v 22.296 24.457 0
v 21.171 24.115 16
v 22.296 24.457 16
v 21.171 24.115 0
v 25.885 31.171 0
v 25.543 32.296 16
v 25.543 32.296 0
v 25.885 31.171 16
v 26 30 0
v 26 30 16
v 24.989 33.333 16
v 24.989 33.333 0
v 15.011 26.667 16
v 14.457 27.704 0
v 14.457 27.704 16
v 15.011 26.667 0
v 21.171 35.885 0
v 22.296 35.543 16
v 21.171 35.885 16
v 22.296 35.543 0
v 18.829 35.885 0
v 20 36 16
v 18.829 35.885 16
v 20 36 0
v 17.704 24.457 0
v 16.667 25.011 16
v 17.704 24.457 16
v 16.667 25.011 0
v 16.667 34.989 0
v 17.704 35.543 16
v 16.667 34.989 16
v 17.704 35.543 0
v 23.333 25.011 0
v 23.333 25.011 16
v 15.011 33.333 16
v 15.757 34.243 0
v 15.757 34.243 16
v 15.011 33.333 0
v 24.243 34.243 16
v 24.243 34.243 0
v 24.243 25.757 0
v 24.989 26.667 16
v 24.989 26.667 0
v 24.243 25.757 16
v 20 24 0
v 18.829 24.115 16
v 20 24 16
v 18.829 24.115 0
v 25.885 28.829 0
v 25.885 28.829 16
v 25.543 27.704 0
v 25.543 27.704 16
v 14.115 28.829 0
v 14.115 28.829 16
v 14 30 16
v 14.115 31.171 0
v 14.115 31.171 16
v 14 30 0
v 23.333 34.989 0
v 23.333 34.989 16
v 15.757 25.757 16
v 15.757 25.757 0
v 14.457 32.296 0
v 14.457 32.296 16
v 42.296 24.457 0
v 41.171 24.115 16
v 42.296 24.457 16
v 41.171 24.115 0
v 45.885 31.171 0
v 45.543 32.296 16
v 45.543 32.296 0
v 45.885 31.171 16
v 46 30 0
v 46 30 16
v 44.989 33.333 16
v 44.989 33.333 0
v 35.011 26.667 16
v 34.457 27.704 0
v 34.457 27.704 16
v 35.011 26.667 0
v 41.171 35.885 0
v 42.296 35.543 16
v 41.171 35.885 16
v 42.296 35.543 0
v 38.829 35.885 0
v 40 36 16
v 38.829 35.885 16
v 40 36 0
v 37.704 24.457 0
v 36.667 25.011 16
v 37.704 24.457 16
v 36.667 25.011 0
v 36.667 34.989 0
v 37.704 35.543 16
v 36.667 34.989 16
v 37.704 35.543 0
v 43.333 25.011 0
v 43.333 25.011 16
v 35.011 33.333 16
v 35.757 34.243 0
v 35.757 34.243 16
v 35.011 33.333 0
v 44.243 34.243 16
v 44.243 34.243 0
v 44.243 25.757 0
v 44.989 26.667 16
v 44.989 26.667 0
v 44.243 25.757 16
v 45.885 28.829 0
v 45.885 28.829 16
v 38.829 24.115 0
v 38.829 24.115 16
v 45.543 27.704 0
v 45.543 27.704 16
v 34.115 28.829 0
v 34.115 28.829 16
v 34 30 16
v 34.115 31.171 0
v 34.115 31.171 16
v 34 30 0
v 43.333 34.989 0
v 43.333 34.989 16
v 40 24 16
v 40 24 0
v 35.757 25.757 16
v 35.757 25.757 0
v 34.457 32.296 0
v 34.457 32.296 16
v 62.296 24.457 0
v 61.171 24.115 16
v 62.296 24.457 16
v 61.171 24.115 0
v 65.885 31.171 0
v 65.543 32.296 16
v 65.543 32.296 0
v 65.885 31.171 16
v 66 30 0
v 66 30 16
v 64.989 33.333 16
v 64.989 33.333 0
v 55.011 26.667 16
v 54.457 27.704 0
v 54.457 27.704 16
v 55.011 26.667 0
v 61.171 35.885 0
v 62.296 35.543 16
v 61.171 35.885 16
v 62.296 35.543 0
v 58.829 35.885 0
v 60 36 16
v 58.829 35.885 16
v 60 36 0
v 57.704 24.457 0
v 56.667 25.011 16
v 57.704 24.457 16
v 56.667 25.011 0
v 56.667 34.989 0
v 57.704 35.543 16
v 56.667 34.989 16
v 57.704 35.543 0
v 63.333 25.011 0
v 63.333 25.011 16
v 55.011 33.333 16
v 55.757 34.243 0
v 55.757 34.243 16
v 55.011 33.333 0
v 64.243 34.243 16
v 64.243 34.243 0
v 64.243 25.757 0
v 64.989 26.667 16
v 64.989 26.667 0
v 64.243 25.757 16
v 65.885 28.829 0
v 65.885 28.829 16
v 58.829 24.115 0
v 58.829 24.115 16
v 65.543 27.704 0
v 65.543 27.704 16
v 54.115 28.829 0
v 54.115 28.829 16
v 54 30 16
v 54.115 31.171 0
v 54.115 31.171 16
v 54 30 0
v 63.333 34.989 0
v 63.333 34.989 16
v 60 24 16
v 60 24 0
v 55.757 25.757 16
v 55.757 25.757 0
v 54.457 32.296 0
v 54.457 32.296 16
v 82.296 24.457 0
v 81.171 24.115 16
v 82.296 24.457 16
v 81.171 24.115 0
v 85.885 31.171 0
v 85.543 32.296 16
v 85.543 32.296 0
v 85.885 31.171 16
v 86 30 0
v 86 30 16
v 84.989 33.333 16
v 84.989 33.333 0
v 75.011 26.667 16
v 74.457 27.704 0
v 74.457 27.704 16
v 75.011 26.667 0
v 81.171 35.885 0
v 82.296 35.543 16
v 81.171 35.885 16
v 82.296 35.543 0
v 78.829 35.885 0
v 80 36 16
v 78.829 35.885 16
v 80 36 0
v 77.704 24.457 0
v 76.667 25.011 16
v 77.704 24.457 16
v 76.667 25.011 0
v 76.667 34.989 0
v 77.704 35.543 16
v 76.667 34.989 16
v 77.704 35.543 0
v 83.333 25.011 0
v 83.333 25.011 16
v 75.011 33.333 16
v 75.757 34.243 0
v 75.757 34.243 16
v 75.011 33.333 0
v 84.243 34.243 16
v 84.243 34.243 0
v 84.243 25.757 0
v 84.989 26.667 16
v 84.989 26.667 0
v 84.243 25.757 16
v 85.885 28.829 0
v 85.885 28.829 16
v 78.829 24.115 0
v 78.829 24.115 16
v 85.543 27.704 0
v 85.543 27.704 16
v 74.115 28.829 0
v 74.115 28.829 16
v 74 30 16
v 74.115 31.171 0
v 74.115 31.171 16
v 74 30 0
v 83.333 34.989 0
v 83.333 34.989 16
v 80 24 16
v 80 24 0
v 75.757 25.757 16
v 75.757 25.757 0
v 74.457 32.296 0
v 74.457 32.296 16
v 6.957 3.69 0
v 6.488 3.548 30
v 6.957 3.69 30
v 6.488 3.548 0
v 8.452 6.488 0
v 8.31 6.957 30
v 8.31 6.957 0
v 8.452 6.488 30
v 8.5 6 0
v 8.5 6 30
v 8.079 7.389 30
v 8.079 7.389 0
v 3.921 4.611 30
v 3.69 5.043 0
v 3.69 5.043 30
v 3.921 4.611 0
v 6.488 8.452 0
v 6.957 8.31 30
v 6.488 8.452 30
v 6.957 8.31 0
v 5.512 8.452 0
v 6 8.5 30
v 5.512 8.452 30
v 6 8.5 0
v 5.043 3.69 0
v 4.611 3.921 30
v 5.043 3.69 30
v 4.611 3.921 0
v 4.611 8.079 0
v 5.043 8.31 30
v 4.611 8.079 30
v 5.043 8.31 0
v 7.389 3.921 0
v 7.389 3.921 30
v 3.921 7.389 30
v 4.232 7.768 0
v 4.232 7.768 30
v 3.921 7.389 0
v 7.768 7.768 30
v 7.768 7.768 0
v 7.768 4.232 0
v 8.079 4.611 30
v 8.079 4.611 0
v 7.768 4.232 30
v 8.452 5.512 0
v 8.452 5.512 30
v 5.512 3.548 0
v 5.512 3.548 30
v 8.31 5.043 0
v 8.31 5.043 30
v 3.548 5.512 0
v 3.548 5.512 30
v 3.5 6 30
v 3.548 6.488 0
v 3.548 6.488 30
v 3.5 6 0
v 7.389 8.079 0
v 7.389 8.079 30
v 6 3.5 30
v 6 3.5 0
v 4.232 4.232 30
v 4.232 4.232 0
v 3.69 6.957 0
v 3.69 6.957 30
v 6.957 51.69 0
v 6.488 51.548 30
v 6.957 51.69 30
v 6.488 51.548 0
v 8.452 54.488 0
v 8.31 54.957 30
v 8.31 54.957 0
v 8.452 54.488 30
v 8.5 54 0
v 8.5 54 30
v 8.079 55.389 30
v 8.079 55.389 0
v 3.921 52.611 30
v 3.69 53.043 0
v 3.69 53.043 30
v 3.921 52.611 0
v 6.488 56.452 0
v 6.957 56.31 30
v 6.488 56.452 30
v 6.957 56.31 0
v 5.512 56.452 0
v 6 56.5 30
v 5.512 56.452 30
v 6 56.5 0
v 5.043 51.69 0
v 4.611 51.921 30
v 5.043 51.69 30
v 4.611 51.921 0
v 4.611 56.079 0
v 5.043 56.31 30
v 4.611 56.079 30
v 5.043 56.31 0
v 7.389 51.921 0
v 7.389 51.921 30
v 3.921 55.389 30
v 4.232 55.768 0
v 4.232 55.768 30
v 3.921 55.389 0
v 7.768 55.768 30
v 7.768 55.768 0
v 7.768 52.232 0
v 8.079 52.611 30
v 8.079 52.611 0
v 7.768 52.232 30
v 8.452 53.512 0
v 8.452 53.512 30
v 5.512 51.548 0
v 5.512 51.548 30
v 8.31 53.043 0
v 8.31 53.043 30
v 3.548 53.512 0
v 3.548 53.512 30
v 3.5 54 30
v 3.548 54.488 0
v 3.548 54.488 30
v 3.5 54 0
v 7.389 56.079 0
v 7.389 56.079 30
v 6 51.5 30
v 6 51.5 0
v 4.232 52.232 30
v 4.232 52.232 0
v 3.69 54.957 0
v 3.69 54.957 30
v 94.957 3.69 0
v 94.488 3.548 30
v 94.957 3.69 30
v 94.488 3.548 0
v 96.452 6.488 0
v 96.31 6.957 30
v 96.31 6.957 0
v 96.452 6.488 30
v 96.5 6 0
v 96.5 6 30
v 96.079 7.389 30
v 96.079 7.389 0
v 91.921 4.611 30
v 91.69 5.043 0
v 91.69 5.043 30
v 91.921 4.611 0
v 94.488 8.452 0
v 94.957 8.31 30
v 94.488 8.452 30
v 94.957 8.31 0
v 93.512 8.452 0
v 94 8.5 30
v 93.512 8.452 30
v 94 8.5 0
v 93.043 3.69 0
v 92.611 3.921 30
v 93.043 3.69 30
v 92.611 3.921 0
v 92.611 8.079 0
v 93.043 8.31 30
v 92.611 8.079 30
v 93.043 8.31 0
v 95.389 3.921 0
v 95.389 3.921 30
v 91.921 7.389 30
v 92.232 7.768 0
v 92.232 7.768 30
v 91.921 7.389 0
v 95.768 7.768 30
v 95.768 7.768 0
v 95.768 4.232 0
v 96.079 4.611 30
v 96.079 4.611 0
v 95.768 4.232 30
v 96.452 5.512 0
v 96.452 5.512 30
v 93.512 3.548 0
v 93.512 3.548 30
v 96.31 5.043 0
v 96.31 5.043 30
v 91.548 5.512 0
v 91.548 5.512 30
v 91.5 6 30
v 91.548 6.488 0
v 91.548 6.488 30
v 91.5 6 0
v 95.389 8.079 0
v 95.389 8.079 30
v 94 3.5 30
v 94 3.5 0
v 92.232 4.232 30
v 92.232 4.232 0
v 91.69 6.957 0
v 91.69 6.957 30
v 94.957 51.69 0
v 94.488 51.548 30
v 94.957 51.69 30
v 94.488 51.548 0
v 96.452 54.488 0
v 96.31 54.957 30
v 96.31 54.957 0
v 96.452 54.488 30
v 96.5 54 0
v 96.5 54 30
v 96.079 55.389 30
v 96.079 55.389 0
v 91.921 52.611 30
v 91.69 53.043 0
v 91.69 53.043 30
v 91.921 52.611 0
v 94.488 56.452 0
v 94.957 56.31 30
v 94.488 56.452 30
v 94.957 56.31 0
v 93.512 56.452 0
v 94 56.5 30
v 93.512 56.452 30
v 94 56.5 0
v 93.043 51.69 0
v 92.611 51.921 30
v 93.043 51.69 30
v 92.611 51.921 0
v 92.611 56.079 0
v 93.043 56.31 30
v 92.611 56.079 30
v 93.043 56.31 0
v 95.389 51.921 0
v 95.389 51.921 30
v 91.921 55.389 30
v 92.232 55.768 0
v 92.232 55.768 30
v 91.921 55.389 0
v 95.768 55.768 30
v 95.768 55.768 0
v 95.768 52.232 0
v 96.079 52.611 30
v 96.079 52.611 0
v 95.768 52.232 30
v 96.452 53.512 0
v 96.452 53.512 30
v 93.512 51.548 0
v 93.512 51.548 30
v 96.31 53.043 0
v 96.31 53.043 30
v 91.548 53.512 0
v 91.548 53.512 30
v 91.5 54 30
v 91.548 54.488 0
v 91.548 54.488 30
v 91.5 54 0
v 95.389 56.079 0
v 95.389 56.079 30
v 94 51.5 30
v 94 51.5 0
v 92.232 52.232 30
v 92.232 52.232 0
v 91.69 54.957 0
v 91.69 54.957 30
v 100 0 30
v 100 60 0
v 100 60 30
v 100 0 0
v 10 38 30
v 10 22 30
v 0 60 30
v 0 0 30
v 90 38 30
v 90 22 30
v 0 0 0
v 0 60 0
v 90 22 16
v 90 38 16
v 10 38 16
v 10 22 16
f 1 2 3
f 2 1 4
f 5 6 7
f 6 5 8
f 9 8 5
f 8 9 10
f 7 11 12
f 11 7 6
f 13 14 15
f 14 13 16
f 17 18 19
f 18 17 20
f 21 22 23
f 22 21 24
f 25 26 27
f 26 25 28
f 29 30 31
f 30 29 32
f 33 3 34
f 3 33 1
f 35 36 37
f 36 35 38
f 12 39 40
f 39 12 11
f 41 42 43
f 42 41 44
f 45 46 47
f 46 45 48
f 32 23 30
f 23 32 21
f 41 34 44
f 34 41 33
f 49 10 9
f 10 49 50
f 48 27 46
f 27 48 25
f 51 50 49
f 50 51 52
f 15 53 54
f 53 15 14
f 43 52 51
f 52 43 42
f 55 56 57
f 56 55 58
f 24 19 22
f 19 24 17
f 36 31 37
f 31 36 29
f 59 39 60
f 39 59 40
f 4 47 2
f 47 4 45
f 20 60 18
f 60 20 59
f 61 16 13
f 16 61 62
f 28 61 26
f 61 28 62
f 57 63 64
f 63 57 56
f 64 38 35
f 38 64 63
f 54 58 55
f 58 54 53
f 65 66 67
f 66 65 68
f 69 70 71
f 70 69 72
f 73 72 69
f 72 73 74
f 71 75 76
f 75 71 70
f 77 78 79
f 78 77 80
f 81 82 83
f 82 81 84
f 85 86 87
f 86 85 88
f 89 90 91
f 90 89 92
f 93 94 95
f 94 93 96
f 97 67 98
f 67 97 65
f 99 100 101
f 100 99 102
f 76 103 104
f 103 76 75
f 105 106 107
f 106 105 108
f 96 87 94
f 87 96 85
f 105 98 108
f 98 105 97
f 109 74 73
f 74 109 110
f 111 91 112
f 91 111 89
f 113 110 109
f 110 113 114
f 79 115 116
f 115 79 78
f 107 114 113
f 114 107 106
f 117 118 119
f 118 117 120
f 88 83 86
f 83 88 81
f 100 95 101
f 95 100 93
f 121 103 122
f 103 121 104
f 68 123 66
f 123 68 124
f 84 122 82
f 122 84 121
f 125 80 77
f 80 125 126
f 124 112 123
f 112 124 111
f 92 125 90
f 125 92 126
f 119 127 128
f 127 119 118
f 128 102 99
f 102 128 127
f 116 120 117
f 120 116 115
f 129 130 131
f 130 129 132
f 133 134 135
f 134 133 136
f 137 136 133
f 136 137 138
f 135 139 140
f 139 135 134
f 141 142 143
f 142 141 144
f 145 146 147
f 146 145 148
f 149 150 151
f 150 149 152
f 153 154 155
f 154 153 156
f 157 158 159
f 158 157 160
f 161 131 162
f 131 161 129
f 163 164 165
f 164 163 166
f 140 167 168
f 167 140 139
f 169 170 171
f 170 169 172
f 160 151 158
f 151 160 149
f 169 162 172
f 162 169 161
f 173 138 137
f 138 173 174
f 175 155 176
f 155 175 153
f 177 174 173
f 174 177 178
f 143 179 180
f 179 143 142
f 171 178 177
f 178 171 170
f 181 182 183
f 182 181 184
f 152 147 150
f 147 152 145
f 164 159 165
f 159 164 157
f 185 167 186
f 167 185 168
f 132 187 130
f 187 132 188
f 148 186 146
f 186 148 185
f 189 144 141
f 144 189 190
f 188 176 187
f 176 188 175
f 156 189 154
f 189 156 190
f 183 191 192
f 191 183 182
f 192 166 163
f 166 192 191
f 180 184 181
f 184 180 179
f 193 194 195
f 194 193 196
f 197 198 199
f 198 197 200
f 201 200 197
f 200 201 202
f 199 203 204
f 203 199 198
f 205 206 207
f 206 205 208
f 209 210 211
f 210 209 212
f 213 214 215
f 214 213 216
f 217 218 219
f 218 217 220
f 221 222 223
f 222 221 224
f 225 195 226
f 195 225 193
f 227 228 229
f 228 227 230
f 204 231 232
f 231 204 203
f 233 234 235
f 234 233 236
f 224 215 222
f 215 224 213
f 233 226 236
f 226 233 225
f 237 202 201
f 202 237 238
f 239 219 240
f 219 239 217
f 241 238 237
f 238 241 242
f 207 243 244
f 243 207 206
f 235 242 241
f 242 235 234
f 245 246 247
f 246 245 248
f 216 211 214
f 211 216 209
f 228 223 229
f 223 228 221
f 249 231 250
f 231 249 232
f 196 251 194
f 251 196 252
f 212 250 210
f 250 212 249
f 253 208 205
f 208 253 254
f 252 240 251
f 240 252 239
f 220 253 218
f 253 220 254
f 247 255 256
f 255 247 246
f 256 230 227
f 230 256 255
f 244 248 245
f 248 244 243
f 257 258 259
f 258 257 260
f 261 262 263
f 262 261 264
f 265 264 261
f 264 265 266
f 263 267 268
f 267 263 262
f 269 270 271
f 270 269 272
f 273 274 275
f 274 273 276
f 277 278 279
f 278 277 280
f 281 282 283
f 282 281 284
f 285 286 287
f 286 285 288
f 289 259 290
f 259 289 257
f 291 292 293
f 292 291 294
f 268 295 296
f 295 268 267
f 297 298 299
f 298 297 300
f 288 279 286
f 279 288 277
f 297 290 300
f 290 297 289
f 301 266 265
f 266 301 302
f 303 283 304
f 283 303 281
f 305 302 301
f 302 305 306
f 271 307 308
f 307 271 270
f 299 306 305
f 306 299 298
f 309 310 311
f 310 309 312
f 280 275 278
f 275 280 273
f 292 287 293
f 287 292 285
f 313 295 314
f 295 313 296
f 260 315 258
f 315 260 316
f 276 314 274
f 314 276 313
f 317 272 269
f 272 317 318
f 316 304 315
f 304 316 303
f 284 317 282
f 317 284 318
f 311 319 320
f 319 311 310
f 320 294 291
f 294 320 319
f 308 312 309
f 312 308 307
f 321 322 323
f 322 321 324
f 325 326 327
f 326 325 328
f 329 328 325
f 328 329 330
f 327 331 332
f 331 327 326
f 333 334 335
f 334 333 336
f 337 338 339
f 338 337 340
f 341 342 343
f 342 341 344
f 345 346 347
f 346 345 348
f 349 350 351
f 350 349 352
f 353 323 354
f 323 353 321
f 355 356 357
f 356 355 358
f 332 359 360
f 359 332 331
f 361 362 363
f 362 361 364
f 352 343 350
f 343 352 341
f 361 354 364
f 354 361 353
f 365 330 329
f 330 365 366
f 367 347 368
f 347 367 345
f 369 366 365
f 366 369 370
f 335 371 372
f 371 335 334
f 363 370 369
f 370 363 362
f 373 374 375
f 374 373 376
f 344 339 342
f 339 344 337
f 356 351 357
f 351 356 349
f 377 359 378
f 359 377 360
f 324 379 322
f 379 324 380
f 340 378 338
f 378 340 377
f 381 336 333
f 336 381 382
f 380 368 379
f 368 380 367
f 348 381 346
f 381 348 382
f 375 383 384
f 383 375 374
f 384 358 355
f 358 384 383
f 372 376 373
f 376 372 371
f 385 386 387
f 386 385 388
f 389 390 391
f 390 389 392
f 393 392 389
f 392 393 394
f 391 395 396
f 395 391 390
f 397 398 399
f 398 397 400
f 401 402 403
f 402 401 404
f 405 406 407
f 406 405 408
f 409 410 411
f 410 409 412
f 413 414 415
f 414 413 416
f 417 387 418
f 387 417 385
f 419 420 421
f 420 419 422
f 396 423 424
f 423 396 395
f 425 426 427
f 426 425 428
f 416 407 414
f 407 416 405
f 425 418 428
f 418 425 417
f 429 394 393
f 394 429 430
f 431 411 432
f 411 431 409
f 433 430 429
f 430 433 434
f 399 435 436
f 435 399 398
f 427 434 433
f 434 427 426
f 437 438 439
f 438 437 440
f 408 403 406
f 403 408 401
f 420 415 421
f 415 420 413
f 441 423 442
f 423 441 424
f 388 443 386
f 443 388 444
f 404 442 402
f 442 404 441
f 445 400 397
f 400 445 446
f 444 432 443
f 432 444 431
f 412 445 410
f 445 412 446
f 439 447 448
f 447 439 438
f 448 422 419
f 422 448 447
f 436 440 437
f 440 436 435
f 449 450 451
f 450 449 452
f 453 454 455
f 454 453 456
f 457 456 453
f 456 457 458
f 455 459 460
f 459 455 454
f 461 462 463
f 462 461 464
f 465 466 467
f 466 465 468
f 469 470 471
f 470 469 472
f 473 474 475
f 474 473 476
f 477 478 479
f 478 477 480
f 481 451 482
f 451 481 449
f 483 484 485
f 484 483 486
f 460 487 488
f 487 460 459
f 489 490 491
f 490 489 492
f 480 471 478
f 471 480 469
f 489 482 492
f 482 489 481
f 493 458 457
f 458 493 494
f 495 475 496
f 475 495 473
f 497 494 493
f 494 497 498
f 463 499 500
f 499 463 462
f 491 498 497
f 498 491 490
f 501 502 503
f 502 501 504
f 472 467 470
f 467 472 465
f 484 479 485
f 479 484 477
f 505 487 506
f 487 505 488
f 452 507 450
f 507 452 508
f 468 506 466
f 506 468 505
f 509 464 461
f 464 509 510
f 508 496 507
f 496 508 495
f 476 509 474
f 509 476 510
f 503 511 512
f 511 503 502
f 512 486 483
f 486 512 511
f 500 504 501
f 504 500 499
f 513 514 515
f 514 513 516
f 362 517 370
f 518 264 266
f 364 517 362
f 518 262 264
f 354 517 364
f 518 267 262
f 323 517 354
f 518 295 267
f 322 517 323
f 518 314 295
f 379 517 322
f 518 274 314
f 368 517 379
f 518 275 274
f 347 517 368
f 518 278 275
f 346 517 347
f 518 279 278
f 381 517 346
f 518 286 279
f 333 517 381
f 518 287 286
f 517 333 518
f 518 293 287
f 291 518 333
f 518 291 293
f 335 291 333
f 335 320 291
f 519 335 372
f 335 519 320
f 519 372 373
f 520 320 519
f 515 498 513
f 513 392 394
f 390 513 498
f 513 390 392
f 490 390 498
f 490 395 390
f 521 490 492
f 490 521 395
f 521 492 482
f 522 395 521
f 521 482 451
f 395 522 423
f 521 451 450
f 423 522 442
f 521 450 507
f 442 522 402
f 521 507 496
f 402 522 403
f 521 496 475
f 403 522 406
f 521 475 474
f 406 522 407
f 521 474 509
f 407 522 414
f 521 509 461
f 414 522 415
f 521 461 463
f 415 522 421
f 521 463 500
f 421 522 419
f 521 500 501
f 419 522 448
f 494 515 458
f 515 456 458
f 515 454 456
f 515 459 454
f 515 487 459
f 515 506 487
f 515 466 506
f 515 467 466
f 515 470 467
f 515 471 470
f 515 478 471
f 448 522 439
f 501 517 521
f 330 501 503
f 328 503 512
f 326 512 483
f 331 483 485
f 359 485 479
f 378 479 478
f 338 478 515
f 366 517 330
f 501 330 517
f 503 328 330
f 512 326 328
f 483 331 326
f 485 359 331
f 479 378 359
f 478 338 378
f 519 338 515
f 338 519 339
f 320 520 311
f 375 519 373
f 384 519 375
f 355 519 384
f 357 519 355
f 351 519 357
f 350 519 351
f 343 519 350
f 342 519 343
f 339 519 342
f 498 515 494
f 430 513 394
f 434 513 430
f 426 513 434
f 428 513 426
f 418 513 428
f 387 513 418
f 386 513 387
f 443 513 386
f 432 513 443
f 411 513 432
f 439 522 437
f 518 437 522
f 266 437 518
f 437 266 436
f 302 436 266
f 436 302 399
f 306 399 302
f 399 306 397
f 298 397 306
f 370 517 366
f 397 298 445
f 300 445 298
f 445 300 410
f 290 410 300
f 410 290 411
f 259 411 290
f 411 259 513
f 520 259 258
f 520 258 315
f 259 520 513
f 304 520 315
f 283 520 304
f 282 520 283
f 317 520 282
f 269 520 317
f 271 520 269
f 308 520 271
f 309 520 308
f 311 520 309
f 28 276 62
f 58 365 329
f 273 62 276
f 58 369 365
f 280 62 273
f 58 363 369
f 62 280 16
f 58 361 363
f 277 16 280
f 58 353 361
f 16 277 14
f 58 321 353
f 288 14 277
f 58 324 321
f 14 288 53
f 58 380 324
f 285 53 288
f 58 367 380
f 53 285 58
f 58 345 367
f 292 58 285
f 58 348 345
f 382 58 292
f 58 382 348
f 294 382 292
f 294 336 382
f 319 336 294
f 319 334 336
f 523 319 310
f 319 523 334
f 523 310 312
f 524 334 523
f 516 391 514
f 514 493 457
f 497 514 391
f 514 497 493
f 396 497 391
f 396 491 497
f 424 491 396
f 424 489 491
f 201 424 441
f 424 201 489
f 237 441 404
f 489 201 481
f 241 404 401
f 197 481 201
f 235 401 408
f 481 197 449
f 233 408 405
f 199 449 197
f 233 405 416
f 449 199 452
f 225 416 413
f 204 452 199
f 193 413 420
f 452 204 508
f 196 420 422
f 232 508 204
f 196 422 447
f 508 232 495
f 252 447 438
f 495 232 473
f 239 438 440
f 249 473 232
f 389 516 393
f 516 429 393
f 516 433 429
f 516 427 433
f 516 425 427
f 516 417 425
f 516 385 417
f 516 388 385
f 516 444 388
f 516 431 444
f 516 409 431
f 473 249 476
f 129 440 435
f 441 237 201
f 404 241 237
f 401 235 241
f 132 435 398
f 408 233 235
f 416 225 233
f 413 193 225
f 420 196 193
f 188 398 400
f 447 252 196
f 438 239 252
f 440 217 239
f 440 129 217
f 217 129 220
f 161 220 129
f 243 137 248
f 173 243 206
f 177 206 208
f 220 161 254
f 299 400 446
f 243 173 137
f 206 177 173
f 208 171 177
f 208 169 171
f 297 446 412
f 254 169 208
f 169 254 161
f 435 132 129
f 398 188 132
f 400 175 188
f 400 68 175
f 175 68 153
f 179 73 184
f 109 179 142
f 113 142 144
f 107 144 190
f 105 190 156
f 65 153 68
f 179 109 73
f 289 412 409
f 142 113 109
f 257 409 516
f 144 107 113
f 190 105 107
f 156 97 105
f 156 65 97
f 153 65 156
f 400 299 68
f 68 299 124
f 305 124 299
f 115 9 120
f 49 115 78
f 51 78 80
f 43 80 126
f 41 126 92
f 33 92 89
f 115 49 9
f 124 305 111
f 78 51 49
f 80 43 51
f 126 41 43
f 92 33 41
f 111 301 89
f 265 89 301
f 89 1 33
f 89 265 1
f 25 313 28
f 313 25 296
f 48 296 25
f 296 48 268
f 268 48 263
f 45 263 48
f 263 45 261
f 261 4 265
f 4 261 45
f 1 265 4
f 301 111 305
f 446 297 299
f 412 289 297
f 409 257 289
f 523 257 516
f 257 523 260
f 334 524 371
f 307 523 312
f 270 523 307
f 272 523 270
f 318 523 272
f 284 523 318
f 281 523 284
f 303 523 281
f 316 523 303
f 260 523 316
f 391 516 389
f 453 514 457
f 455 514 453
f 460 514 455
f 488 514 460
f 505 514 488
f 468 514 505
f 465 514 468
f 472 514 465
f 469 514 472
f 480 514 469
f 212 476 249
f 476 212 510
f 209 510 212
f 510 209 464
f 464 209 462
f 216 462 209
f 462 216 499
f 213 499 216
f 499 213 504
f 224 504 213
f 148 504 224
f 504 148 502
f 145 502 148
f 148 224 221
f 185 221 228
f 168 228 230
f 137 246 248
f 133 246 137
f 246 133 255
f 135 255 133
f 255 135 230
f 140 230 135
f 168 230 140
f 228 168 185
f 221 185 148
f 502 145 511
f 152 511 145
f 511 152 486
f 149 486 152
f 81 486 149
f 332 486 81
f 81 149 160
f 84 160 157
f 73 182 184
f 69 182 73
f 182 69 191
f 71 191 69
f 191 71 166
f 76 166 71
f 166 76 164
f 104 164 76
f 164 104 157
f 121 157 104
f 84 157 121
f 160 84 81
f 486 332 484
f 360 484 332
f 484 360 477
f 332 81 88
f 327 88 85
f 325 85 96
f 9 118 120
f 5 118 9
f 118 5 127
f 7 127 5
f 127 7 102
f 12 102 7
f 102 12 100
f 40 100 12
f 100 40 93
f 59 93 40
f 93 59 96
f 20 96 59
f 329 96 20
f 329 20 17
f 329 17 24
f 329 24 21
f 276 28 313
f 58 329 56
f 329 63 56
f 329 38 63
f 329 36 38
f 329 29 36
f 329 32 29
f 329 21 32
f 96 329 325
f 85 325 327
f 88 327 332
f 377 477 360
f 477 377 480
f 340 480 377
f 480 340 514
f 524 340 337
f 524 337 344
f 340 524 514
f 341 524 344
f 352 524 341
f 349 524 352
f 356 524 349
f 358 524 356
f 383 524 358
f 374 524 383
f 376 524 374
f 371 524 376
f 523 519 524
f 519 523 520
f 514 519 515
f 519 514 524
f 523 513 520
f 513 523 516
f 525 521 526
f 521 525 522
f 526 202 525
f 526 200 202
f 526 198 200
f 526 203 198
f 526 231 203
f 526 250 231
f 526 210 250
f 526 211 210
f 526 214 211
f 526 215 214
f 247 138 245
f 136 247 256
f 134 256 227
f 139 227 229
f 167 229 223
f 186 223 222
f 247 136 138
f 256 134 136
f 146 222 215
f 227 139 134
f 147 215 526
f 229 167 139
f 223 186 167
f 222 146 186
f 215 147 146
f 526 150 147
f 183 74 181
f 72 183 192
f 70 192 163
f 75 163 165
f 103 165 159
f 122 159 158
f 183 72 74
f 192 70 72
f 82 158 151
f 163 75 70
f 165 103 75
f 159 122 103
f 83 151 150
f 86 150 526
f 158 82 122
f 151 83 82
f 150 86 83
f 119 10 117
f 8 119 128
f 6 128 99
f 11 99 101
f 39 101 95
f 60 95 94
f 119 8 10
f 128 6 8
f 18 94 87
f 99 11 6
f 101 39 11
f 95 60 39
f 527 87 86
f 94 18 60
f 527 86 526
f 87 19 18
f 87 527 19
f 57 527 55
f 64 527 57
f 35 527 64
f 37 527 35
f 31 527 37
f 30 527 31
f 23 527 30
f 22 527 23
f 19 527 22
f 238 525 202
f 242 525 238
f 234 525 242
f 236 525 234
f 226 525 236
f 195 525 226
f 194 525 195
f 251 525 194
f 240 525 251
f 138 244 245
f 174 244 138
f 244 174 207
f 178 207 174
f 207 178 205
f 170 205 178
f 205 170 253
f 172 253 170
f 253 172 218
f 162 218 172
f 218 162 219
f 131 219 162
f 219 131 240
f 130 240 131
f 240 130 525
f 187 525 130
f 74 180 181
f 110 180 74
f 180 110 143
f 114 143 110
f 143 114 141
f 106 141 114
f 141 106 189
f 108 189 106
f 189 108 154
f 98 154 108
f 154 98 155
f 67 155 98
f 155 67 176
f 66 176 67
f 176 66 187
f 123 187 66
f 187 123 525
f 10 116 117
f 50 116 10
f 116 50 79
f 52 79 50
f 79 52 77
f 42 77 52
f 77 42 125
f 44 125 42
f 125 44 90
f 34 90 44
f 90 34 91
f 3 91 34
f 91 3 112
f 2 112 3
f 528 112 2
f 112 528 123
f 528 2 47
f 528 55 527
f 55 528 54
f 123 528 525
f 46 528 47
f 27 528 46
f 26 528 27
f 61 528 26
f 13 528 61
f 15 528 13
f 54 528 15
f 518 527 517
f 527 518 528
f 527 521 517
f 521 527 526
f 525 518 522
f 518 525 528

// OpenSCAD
$fn = 32;

// ----------------------------------------------------------------------
// Manifold block: gallery_top manifold
// ----------------------------------------------------------------------

// --- parameters (mm) ---
block_l = 100;            // block length, X
block_w = 60;             // block width, Y
block_h = 30;             // block height, Z
port_d = 12;              // port bore diameter
port_pitch = 20;          // port pitch along X
gallery_d = 16;           // top gallery width, Y
gallery_depth = 14;       // gallery pocket depth
wall_p = 10;              // gallery end wall thickness, X
mnt_d = 5;                // mounting hole diameter
mnt_in = 6;               // mounting hole inset from the edges
fit_tol = 0.1;            // tolerance for press fits, mm
free_tol = 0.5;           // tolerance for clearance fits, mm

n_ports = 4;  // ports in the row
port_x0 = (block_l - (n_ports - 1) * port_pitch) / 2;  // first port X

difference() {
  cube([block_l, block_w, block_h]);
  for (i = [0 : n_ports - 1])
    translate([port_x0 + i * port_pitch, block_w / 2, -1])
      cylinder(h = block_h + 2, d = port_d);
  translate([wall_p, block_w / 2 - gallery_d / 2, block_h - gallery_depth])
    cube([block_l - 2 * wall_p, gallery_d, gallery_depth + 1]);
  for (cx = [mnt_in, block_l - mnt_in])
    for (cy = [mnt_in, block_w - mnt_in])
      translate([cx, cy, -1]) cylinder(h = block_h + 2, d = mnt_d);
}
